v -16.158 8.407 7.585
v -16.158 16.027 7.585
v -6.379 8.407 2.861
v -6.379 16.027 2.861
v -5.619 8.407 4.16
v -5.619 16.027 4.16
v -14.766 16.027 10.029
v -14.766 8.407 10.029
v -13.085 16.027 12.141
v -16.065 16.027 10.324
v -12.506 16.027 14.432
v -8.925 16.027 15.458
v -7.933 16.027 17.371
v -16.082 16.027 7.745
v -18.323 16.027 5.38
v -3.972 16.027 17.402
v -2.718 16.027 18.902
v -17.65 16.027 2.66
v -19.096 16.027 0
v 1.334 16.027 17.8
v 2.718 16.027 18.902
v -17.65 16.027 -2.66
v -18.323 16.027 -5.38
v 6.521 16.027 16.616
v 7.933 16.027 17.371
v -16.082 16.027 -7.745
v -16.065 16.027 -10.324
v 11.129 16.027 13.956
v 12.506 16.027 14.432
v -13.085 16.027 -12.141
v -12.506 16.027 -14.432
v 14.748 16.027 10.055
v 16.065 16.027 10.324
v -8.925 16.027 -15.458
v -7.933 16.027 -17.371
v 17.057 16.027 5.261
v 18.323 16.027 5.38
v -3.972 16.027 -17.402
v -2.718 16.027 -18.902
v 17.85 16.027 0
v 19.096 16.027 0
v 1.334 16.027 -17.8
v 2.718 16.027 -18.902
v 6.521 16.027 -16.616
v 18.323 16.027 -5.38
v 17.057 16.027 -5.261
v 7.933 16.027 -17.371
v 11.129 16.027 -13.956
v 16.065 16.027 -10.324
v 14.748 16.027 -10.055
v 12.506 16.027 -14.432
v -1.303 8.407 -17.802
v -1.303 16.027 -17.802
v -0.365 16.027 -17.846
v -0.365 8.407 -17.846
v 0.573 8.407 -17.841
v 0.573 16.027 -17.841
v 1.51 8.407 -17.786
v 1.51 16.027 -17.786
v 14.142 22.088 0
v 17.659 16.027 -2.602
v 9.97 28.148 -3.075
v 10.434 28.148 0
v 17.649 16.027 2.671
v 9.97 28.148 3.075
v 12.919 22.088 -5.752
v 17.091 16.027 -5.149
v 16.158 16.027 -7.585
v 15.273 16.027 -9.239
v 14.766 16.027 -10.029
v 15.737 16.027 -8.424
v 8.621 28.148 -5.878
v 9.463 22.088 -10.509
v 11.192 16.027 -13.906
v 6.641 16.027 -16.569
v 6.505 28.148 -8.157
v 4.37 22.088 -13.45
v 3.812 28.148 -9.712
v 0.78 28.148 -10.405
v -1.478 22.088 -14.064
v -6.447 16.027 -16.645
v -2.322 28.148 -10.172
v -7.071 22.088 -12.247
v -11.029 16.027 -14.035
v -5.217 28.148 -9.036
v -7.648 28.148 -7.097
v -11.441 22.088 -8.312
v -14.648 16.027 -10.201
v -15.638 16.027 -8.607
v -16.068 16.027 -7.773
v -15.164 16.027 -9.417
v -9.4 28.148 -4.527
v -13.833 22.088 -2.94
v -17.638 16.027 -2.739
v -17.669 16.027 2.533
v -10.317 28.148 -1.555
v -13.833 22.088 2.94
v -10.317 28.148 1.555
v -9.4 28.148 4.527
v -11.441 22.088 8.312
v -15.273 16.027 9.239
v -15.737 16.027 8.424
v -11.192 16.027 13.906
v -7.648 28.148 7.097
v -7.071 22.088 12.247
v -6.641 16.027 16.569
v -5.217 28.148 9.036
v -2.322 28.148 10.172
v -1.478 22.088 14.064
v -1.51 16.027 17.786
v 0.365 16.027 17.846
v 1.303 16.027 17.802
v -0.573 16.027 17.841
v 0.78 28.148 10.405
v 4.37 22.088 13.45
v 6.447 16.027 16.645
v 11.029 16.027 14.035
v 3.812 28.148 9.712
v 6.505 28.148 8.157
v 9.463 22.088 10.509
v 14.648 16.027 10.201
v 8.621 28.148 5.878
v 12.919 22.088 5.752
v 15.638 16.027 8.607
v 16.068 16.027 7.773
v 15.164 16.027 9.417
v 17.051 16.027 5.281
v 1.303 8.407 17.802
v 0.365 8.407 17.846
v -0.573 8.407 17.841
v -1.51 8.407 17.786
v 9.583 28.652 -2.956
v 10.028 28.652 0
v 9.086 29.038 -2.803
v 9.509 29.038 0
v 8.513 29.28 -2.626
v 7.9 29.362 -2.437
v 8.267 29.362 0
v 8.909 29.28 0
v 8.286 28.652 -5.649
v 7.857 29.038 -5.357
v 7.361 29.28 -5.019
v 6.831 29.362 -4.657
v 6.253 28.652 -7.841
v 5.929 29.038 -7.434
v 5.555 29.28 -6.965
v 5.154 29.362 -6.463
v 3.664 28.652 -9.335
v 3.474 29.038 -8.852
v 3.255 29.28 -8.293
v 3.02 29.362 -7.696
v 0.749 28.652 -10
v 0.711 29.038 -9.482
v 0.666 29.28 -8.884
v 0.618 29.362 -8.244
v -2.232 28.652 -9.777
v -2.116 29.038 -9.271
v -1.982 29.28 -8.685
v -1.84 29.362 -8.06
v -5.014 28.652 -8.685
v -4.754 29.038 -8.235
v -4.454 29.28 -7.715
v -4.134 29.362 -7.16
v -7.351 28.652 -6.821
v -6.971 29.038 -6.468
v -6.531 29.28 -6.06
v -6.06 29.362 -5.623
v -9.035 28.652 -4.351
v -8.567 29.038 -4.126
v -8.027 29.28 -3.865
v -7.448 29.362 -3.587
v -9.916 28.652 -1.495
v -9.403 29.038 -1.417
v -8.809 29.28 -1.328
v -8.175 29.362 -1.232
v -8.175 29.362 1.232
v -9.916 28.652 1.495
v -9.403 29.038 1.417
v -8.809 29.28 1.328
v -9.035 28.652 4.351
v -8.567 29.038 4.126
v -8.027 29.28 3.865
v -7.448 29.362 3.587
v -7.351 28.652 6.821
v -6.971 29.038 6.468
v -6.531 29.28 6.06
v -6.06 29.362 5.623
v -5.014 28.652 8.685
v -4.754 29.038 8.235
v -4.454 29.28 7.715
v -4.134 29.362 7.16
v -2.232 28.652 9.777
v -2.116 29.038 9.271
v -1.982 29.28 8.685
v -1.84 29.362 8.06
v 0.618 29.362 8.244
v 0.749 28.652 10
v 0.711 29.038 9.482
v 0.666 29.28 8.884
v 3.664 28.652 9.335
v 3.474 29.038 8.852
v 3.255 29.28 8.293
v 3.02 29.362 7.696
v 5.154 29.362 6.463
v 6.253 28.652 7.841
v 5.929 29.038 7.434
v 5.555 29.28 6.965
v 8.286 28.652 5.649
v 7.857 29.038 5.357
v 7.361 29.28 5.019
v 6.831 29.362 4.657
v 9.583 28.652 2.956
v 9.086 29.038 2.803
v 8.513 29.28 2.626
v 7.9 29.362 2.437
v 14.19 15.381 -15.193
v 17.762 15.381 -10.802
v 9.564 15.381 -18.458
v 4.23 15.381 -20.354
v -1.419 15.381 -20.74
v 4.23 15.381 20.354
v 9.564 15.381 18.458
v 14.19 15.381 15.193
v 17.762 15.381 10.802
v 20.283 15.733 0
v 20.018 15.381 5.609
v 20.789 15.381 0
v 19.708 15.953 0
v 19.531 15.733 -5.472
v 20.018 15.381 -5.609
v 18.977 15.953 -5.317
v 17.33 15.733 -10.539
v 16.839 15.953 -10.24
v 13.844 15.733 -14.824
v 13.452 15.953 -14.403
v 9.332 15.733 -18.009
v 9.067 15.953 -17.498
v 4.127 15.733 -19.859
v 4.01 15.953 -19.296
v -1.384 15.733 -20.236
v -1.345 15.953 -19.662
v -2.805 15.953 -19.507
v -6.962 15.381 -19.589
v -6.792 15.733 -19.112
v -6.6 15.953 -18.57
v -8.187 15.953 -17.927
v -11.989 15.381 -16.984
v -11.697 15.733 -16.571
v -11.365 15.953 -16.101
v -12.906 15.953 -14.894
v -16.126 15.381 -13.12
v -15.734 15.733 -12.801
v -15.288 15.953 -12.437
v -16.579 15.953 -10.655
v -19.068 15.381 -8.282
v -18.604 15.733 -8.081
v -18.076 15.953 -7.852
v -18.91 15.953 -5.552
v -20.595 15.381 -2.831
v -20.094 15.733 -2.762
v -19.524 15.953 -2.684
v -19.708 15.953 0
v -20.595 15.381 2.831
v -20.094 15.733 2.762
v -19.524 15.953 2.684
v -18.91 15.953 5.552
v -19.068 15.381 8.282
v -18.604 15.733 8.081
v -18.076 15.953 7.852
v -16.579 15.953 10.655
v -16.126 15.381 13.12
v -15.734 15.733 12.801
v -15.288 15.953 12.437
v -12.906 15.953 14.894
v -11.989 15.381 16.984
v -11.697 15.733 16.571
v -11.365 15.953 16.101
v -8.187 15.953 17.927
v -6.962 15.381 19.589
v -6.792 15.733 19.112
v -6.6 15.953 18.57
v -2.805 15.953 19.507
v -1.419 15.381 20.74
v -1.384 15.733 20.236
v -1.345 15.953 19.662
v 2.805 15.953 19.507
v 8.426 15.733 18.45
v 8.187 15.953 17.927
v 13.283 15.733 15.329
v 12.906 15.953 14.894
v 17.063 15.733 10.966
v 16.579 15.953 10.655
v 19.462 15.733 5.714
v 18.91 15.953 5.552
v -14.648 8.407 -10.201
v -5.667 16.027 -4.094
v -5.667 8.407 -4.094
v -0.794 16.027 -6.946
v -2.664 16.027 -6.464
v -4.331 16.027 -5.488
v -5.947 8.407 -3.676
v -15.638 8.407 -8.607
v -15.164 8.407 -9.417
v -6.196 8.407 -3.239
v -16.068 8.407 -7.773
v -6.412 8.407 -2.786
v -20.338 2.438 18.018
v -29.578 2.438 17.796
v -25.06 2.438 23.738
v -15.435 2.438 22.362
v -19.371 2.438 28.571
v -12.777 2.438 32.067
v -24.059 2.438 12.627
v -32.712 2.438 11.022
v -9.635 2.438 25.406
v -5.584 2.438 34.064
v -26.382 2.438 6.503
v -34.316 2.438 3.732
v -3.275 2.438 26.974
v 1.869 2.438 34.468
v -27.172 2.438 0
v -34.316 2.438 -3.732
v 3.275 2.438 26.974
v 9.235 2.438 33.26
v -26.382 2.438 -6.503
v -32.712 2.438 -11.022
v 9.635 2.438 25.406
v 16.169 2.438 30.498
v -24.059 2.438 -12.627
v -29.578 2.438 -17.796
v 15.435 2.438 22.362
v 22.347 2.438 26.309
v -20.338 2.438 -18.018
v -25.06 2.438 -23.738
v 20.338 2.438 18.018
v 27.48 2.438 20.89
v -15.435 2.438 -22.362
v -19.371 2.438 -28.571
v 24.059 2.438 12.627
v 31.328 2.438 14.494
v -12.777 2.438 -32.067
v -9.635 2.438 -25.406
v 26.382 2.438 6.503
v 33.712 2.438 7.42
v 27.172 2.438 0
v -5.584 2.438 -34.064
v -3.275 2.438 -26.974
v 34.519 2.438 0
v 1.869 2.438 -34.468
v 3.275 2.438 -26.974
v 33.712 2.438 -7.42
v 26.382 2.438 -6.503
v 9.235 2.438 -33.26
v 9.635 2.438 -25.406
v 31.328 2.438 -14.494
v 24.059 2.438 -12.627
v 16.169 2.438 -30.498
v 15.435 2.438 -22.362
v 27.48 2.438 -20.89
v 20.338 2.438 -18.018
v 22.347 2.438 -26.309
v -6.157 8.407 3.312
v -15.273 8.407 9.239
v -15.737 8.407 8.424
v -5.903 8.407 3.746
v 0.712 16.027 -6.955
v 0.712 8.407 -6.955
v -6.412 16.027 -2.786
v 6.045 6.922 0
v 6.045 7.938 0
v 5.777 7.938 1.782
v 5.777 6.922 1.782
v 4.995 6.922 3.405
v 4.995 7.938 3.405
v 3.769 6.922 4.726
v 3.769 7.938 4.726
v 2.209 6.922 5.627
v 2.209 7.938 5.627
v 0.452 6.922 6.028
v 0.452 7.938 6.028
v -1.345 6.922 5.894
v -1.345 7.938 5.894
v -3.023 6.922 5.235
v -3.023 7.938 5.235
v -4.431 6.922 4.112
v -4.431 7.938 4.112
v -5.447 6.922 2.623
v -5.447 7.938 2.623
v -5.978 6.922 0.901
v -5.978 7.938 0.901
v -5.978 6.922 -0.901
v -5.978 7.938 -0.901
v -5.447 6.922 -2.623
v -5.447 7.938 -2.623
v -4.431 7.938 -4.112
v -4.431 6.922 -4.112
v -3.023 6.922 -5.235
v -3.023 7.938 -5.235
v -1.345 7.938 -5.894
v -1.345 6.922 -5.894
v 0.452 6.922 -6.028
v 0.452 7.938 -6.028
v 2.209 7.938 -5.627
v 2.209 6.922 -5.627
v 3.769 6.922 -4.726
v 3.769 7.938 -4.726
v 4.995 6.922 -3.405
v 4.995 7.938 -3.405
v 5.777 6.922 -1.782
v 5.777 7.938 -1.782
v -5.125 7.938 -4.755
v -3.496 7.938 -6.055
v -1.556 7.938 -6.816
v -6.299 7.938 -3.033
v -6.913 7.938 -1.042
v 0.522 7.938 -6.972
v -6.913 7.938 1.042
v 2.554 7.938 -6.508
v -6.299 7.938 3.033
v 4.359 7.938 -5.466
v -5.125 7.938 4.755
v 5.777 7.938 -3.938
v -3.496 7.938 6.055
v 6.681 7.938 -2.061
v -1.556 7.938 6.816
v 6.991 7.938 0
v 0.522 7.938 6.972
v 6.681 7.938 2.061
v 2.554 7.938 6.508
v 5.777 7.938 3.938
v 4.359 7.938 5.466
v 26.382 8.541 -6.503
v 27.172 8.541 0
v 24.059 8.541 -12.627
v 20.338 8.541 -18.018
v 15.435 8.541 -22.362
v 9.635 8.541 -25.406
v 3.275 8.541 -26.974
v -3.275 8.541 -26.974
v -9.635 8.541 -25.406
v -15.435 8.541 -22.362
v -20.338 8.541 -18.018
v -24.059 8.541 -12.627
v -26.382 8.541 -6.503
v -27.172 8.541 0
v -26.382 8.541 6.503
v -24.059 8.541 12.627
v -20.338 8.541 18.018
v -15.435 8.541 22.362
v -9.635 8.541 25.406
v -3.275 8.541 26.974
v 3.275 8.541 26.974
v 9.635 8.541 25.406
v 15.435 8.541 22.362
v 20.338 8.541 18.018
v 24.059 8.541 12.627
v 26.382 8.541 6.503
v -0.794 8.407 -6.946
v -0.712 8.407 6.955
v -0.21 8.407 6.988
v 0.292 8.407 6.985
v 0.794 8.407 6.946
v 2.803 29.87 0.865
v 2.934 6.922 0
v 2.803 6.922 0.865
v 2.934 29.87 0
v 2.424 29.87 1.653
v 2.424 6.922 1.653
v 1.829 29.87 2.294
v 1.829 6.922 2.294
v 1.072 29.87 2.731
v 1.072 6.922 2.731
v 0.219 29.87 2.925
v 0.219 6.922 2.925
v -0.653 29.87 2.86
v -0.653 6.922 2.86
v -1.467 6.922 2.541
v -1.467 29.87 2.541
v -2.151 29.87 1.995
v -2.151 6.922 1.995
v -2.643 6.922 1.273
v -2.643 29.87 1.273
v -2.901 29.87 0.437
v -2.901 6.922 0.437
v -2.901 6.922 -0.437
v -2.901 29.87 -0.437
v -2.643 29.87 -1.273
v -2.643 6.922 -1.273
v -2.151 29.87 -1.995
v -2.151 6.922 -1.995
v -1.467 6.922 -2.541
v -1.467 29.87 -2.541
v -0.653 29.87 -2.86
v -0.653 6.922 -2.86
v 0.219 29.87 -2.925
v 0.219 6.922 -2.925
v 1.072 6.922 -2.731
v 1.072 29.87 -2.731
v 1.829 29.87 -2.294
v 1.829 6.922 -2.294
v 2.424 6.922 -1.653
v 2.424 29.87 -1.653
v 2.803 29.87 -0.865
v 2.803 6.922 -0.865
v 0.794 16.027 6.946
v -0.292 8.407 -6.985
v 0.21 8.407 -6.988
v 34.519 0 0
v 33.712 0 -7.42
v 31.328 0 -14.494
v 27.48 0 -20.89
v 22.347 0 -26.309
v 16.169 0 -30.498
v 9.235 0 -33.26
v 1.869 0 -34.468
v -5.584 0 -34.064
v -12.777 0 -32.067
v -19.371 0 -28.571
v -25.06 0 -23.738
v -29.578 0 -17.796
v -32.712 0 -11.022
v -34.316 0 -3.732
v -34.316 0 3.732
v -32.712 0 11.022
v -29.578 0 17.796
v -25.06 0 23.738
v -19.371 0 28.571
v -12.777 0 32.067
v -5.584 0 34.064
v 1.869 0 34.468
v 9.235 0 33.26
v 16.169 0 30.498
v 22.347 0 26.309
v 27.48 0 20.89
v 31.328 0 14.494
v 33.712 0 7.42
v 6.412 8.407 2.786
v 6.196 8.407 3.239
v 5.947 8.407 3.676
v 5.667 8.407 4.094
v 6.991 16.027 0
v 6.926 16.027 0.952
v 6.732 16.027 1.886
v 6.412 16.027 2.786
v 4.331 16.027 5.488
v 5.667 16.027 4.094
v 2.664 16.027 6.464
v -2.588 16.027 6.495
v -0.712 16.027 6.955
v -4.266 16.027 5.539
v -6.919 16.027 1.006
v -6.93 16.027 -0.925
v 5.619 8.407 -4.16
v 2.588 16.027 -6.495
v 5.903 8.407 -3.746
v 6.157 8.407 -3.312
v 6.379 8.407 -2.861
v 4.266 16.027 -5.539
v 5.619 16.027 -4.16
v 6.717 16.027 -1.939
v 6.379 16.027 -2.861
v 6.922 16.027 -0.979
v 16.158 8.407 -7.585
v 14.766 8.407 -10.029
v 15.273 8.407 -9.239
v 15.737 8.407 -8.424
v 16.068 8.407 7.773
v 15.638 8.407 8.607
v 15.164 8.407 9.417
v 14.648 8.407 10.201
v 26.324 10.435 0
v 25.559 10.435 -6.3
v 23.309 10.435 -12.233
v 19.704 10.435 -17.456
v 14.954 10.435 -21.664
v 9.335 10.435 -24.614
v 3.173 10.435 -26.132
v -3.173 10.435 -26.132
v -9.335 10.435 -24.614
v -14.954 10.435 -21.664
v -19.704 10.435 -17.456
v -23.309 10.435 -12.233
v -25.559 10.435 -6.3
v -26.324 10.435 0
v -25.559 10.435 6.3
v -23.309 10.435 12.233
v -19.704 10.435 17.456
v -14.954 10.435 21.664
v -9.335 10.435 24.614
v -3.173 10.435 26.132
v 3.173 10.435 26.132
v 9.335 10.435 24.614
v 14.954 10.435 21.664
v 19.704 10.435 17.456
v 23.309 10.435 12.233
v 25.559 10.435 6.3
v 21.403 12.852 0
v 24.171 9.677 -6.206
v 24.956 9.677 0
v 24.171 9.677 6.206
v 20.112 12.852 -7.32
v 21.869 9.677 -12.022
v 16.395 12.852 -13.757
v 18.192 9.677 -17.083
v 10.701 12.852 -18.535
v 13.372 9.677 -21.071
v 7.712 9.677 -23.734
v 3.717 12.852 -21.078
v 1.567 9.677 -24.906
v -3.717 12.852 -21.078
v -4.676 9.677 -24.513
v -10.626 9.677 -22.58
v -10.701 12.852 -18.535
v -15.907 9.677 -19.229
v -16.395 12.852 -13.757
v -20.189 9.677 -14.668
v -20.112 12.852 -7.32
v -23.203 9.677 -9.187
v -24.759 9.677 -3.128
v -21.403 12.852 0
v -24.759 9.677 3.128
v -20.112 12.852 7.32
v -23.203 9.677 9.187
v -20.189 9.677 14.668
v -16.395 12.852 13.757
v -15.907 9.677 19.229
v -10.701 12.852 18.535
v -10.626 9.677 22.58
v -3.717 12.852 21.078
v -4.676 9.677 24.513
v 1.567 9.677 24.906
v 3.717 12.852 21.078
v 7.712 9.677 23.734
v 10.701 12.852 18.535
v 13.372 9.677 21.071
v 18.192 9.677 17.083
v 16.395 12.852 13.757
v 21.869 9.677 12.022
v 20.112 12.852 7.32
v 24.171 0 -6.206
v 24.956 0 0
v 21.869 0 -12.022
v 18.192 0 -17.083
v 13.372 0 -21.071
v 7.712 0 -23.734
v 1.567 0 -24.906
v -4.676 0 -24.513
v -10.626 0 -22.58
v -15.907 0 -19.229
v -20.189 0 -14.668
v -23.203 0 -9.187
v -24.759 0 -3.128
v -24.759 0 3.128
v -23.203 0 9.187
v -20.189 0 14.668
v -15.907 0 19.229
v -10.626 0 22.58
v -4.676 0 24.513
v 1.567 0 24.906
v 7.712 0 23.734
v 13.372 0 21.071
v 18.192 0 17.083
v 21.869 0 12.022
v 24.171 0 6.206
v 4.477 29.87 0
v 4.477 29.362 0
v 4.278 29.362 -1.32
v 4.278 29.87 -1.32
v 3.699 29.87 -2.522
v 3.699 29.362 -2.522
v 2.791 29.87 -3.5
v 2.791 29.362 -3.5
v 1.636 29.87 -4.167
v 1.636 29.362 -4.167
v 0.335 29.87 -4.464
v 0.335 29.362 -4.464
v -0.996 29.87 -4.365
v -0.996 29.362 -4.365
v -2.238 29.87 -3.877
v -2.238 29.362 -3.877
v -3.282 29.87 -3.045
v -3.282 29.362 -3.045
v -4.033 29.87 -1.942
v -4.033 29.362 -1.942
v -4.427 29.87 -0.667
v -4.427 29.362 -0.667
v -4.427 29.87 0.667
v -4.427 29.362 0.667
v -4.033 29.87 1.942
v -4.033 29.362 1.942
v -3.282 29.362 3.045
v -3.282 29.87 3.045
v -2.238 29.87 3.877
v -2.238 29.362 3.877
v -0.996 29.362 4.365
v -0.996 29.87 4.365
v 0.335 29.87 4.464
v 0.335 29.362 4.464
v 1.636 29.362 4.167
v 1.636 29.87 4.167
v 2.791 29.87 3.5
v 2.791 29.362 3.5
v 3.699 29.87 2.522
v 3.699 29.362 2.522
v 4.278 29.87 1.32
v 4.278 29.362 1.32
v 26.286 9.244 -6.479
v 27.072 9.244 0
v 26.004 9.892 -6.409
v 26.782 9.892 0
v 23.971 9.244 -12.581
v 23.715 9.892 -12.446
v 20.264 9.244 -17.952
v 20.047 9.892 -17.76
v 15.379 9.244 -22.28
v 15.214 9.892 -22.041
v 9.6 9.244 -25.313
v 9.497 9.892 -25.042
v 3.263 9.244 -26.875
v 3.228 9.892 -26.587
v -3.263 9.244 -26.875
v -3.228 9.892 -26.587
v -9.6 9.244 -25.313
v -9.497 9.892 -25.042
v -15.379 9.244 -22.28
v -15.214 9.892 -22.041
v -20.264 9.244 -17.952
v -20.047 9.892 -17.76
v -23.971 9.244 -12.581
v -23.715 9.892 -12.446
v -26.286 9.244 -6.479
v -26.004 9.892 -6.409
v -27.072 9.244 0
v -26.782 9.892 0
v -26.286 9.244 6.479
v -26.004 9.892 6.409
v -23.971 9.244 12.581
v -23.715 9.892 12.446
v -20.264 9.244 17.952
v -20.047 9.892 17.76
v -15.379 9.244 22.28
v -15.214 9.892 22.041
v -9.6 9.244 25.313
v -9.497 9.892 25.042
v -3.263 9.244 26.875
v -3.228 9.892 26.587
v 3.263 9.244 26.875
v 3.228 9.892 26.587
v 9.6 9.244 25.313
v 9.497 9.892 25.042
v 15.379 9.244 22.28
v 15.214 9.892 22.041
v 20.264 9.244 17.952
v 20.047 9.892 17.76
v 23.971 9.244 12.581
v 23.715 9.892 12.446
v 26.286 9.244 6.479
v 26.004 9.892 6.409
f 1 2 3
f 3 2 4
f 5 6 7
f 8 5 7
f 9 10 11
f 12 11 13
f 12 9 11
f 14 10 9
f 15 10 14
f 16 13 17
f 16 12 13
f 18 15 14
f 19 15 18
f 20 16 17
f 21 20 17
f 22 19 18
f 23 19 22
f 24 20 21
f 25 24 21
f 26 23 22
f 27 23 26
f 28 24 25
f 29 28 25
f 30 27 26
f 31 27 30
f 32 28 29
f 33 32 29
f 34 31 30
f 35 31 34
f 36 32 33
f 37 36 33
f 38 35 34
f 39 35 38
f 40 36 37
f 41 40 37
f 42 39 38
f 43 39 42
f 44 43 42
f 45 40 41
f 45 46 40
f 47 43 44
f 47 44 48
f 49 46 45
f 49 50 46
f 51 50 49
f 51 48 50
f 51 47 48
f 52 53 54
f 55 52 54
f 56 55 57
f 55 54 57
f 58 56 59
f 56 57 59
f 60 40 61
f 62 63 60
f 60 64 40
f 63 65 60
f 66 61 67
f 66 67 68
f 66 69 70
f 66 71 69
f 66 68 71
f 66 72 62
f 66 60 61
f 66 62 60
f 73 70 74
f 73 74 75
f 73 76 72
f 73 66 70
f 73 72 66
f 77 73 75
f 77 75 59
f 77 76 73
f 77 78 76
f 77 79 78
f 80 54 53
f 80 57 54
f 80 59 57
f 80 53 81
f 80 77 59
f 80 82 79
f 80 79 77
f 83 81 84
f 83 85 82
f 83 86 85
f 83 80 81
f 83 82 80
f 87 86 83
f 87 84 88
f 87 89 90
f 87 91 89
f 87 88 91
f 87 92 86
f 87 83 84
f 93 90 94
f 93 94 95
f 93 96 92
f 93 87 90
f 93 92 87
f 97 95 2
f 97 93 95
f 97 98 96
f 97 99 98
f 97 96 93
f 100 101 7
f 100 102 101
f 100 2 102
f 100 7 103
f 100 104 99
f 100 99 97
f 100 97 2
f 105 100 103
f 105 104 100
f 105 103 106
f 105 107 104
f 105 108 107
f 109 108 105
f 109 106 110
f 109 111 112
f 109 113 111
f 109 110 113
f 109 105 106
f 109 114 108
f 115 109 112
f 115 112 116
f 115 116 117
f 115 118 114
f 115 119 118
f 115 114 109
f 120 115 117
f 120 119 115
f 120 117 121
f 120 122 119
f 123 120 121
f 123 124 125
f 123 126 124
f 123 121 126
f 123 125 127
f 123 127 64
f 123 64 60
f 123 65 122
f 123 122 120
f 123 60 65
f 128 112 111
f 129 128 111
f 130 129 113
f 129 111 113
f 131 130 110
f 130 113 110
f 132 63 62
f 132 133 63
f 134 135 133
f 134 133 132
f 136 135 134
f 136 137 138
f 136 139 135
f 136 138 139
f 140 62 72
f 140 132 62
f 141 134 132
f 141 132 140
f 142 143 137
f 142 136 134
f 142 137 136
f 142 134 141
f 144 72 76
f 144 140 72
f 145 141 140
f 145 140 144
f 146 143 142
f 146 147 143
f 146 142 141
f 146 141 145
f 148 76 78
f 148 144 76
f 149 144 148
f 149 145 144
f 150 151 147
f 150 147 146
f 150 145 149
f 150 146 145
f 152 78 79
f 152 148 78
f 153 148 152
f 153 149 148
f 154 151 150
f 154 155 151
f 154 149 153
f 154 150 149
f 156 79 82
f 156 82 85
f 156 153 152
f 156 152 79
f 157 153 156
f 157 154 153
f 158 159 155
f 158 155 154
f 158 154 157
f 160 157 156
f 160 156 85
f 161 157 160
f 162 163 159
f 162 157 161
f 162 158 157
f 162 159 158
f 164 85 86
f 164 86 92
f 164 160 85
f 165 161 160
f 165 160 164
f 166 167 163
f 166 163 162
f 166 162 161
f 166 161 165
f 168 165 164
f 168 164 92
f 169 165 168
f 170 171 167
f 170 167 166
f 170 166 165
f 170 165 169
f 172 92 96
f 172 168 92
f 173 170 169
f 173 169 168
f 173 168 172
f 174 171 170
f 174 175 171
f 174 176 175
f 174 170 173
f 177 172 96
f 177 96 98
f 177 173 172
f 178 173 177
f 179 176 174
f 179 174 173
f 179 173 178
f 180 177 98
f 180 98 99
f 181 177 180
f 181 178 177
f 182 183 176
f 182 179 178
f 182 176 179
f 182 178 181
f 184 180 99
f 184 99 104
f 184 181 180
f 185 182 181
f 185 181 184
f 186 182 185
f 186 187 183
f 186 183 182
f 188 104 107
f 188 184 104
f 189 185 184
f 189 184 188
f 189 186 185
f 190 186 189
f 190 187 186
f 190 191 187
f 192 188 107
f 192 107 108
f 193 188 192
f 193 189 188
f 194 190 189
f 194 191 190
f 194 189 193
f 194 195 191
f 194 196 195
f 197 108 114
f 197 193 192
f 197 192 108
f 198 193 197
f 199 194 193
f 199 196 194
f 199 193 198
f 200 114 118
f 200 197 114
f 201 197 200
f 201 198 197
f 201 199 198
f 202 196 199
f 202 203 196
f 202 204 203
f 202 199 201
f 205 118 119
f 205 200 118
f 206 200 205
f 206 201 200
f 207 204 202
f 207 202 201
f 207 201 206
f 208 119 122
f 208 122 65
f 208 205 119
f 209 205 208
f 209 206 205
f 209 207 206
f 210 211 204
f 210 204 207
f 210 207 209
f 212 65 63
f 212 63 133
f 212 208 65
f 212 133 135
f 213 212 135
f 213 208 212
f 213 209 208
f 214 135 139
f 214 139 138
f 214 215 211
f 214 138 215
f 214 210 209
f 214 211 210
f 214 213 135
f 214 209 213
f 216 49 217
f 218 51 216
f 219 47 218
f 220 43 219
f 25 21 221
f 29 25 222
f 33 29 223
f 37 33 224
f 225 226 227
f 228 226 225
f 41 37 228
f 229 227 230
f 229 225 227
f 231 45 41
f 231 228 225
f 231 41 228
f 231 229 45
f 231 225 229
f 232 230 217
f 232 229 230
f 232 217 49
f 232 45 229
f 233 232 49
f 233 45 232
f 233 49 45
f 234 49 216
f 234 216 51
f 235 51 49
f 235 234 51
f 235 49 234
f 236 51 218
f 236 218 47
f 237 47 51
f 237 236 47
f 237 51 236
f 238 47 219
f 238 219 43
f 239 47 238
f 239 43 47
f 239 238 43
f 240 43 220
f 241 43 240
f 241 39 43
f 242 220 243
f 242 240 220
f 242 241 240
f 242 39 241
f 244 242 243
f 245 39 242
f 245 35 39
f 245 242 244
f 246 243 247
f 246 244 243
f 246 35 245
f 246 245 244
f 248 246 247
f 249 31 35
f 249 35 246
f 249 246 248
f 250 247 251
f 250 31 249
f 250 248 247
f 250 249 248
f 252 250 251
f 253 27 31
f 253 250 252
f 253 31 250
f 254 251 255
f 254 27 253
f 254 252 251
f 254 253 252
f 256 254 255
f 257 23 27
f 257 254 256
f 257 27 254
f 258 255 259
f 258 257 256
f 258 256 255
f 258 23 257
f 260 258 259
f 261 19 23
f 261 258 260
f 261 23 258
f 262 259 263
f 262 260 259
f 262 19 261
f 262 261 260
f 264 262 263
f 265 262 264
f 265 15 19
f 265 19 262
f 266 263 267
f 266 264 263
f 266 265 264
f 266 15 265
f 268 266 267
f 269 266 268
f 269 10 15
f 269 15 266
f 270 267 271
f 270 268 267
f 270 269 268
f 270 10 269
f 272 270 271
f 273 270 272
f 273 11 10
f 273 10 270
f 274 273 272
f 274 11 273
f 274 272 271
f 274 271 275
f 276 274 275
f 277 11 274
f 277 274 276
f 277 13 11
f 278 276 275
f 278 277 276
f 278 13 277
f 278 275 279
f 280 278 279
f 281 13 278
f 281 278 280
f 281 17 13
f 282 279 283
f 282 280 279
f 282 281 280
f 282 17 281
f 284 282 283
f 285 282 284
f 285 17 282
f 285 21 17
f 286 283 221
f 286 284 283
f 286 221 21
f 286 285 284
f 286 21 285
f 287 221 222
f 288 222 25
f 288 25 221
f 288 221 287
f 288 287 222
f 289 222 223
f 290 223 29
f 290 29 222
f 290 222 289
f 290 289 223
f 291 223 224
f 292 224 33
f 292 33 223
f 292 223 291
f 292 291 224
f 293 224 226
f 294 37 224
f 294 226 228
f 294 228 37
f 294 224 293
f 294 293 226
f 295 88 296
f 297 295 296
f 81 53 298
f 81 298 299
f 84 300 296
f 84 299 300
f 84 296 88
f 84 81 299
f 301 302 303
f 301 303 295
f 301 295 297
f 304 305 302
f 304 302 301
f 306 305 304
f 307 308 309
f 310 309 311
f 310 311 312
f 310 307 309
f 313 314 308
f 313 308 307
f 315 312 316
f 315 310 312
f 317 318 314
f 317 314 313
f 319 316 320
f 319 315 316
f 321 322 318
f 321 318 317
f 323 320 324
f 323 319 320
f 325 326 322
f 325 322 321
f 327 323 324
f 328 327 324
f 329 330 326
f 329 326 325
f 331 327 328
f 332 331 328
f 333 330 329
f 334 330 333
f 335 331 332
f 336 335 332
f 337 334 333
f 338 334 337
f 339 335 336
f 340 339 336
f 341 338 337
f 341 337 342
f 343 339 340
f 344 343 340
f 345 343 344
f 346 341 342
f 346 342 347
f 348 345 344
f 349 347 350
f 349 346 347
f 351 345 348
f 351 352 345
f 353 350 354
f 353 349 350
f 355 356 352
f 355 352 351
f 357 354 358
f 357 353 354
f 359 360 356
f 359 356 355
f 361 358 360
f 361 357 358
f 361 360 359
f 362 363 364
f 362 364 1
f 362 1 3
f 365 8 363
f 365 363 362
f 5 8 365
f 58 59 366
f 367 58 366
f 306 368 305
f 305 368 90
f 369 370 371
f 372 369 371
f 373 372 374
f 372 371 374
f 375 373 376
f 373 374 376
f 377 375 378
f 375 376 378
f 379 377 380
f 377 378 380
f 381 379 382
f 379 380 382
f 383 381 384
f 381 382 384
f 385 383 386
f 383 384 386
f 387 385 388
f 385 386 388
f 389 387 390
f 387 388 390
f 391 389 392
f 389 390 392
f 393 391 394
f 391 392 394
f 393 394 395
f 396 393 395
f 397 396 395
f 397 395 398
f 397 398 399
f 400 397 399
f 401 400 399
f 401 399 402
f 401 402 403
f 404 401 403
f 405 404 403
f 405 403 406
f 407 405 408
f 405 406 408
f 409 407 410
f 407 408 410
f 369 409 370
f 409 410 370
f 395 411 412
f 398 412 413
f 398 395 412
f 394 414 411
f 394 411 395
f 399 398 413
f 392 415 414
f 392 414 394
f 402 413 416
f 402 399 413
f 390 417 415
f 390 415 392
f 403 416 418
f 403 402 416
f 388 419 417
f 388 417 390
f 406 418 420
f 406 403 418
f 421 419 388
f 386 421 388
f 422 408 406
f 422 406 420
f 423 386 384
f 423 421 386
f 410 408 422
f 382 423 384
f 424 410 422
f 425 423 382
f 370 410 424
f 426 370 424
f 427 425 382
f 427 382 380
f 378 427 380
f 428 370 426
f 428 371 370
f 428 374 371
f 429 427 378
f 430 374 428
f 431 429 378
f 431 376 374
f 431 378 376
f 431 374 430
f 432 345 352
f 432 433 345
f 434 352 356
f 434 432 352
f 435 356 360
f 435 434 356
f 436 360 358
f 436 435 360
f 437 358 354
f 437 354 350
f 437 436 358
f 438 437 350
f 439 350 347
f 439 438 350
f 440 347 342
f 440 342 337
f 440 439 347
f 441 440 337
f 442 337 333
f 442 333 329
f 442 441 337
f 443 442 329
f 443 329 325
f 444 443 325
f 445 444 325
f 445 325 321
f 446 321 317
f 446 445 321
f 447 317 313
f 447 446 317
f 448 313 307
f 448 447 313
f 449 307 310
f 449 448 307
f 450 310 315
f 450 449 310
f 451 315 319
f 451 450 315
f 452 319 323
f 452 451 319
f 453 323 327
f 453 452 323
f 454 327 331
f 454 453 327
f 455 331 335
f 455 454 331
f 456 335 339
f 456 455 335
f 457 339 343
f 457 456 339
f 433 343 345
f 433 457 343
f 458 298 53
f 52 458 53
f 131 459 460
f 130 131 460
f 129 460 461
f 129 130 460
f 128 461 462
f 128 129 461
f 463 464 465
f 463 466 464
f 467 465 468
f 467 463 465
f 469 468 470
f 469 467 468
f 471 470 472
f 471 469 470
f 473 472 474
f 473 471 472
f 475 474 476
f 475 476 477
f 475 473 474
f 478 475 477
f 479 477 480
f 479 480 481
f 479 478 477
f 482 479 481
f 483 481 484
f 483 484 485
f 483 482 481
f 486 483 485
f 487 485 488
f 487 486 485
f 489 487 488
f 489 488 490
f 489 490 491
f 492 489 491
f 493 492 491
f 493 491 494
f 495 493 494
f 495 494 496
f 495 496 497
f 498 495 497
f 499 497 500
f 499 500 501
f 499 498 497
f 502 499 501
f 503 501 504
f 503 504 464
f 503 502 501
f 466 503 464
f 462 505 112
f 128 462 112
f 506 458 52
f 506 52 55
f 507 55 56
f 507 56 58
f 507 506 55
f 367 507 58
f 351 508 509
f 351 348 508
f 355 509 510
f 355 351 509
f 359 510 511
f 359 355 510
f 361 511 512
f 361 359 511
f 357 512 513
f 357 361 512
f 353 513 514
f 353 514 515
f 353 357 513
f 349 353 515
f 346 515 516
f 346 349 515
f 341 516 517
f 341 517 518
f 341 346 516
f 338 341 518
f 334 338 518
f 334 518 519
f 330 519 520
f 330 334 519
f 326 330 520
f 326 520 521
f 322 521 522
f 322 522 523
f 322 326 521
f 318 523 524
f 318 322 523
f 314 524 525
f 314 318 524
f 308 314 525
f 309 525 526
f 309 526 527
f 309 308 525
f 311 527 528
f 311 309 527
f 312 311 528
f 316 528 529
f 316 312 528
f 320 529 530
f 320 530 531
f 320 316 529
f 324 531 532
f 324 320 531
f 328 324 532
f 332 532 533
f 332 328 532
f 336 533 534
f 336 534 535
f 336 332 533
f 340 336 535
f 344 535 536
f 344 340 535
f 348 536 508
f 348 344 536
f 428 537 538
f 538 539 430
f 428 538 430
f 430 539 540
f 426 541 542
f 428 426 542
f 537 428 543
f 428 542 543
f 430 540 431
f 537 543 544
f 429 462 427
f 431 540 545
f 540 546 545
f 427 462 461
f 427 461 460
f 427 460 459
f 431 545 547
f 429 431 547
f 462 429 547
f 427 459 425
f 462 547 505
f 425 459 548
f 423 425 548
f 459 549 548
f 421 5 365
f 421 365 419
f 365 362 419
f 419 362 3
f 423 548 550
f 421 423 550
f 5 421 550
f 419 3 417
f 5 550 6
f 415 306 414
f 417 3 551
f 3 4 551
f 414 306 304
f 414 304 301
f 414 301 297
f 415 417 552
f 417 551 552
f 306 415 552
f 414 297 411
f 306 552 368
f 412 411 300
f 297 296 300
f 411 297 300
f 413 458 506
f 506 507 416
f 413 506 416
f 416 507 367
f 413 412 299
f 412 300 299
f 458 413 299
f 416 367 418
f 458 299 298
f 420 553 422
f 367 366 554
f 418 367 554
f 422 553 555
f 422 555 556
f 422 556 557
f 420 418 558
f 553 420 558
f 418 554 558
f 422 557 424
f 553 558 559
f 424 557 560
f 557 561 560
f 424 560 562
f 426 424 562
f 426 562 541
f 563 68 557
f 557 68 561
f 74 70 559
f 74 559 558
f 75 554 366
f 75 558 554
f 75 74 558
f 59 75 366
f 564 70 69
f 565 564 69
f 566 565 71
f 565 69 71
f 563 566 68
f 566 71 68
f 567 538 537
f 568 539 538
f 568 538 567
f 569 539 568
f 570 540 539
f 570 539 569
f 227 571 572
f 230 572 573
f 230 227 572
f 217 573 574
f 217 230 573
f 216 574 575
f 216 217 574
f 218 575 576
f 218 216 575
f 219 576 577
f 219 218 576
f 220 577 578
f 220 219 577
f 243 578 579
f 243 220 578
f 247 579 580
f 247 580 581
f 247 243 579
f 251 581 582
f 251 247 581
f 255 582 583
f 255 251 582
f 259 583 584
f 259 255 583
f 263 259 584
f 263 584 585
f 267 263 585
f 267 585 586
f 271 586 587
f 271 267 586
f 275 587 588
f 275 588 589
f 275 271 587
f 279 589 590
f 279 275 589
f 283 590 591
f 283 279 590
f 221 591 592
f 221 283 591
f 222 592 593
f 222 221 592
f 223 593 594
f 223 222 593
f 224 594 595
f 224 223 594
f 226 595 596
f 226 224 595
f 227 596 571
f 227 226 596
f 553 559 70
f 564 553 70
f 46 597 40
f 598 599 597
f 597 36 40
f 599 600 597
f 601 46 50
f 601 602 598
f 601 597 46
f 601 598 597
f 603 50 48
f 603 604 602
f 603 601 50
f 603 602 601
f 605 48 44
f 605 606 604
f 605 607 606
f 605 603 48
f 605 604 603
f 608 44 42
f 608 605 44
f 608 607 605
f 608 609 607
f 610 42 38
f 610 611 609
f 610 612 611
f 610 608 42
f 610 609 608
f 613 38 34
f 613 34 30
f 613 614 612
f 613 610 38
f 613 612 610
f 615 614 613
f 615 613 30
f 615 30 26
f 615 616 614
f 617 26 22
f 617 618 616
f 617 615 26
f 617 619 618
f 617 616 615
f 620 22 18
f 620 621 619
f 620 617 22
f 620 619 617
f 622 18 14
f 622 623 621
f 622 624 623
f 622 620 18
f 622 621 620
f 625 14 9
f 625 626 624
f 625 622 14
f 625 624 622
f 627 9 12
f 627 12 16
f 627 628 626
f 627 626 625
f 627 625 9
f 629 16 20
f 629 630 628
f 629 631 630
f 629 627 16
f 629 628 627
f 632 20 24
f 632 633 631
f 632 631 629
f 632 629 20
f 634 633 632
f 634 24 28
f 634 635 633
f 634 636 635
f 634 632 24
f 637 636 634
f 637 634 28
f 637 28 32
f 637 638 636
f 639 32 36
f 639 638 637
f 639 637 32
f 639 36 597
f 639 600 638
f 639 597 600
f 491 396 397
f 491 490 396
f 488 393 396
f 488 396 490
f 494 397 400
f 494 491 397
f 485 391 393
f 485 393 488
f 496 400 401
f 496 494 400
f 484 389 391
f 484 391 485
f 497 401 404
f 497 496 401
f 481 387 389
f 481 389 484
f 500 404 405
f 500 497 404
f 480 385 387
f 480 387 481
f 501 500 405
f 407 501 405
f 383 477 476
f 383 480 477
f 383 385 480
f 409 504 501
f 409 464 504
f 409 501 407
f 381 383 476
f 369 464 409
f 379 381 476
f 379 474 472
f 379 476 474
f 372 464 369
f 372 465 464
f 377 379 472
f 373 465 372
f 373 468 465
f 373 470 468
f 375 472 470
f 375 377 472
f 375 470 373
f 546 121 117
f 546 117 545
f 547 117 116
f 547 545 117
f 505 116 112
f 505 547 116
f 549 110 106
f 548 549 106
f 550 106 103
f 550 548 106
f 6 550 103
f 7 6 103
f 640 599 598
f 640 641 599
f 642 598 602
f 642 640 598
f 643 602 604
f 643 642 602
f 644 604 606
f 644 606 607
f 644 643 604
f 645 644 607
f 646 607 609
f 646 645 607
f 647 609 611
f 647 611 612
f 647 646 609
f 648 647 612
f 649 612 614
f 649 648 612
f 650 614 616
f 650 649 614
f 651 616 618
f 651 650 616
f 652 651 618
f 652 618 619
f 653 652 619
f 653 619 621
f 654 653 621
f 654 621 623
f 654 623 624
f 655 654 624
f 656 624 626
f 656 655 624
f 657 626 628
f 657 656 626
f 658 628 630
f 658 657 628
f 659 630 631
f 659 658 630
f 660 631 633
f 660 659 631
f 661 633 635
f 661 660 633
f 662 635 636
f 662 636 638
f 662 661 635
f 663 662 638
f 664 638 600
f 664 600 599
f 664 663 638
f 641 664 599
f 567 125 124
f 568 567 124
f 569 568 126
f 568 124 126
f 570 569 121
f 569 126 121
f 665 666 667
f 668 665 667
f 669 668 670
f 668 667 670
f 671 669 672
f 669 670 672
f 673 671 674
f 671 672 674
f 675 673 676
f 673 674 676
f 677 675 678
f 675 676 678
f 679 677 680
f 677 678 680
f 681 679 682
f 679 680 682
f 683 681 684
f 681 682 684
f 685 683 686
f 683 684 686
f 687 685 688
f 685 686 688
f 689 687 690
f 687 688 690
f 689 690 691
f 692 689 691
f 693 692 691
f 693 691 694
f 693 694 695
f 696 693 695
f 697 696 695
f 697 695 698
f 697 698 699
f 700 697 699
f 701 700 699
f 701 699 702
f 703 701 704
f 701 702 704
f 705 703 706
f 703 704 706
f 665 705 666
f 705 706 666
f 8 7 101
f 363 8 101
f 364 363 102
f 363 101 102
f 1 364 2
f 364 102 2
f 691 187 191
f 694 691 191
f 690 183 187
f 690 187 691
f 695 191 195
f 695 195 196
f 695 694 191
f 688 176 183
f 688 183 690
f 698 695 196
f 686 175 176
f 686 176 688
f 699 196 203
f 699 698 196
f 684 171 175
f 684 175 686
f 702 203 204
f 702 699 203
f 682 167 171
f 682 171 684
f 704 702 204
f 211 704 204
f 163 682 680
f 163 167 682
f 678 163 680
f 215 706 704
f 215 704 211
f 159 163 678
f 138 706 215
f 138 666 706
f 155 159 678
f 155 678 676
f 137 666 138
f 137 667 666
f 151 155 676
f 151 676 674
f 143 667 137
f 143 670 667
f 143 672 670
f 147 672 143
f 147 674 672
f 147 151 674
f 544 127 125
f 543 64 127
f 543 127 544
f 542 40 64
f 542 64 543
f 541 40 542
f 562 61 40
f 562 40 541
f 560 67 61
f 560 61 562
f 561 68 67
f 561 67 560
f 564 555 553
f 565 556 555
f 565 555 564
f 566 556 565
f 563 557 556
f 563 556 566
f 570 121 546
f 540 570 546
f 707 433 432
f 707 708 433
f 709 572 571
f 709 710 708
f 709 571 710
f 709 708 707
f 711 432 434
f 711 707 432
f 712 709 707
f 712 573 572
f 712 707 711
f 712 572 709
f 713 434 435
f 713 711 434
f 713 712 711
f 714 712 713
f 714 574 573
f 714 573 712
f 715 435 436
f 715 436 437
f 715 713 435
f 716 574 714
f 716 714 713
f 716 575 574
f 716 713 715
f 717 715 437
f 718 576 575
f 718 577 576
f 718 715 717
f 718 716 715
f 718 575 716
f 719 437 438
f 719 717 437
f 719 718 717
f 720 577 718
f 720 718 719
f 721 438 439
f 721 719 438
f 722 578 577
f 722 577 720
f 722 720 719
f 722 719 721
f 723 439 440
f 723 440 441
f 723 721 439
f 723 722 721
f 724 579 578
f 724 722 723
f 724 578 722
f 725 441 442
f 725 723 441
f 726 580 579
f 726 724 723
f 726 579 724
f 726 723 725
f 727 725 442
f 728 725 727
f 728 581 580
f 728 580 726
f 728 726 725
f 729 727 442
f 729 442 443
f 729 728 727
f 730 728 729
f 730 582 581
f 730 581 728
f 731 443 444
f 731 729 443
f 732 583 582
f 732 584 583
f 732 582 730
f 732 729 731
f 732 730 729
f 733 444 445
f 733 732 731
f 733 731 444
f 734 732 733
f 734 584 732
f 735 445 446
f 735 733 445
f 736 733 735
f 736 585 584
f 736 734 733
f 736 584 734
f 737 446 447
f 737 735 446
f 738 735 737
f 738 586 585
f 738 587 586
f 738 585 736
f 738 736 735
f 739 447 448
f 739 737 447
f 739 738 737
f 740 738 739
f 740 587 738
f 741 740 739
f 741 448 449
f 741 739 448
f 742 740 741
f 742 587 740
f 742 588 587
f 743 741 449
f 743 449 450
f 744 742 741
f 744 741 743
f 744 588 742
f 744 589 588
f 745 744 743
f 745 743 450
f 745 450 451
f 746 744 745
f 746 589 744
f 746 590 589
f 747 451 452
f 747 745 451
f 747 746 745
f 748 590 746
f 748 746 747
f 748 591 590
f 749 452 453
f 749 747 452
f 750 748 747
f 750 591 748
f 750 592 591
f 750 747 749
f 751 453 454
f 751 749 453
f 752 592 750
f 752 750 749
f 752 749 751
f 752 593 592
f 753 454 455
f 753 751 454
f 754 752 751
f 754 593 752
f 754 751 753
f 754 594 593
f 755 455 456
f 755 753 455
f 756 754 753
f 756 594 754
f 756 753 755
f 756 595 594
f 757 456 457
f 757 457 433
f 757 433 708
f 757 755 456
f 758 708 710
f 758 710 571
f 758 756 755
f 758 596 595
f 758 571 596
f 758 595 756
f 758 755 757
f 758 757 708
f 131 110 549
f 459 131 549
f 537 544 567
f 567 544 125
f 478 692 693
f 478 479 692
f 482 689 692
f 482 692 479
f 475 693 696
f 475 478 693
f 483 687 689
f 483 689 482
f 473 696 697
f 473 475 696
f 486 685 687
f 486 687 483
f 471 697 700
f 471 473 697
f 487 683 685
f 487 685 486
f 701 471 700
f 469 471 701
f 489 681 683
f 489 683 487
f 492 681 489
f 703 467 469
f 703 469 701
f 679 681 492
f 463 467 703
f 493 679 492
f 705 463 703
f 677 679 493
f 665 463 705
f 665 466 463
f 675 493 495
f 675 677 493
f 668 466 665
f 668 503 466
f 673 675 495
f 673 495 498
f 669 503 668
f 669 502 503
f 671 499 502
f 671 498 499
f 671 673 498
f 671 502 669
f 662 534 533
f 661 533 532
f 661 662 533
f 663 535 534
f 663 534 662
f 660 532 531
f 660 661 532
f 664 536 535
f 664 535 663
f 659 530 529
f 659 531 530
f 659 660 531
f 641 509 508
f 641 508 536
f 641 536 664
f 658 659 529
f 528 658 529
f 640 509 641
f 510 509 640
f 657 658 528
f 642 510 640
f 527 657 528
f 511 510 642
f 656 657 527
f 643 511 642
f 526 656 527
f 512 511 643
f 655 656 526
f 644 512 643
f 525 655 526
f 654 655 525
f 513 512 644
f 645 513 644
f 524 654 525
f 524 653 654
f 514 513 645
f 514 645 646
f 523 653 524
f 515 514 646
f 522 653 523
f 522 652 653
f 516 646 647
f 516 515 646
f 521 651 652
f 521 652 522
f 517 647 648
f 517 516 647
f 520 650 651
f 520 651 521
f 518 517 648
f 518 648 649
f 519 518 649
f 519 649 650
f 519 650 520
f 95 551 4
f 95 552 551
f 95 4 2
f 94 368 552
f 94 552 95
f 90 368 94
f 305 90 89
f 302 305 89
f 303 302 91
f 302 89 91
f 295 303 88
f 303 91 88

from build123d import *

# Parameters (mm, degrees)
SKETCH2_R           = 4.47675
SKETCH2_R_2         = 2.9337
BOSS_EXTRUDE1_DEPTH = 0.508
SKETCH3_R           = 6.99135
SKETCH3_R_2         = 2.9337
BOSS_EXTRUDE2_DEPTH = 8.0899
SKETCH4_R           = 6.0452
SKETCH4_R_2         = 2.9337
BOSS_EXTRUDE3_DEPTH = 1.016
BOSS_EXTRUDE4_DEPTH = 7.62


with BuildPart() as part:
    # Sketch1 → Revolve1 (revolve)
    with BuildSketch(Plane.XY):
        with BuildLine():
            Line((27.17165, 0), (34.5186, 0))
            Line((34.5186, 0), (34.5186, 2.4384))
            Line((34.5186, 2.4384), (27.17165, 2.4384))
            Line((27.17165, 2.4384), (27.17165, 8.540823407))
            ThreePointArc((27.17165, 8.540823407), (26.950119612, 9.578271554), (26.324170742, 10.434754118))
            Line((26.324170742, 10.434754118), (20.788951535, 15.381330711))
            ThreePointArc((20.788951535, 15.381330711), (20.002249757, 15.860392204), (19.096430792, 16.0274))
            Line((19.096430792, 16.0274), (17.84985, 16.0274))
            Line((17.84985, 16.0274), (24.9555, 9.6774))
            Line((24.9555, 9.6774), (24.9555, 0))
            Line((24.9555, 0), (27.17165, 0))
        make_face()
    revolve(axis=Axis((0, 0, 0), (0, 1, 0)))


with BuildPart() as body_2:
    # Sketch1<3> → Revolve2 (revolve)
    with BuildSketch(Plane.XY):
        with BuildLine():
            Line((2.9337, 16.0274), (17.84985, 16.0274))
            Line((17.84985, 16.0274), (10.433708778, 28.148063183))
            ThreePointArc((10.433708778, 28.148063183), (9.508951147, 29.038114838), (8.26709457, 29.3624))
            Line((8.26709457, 29.3624), (2.9337, 29.3624))
            Line((2.9337, 29.3624), (2.9337, 16.0274))
        make_face()
    revolve(axis=Axis((0, 0, 0), (0, 1, 0)))

    # Sketch2 → Boss-Extrude1 (add)
    with BuildSketch(Plane(origin=(0, 29.3624, 0), x_dir=(1, 0, 0), z_dir=(0, 1, 0))):
        Circle(SKETCH2_R)
        Circle(SKETCH2_R_2, mode=Mode.SUBTRACT)
    extrude(amount=BOSS_EXTRUDE1_DEPTH)

    # Sketch3 → Boss-Extrude2 (add)
    with BuildSketch(Plane.XZ.offset(-16.0274)):
        Circle(SKETCH3_R)
        Circle(SKETCH3_R_2, mode=Mode.SUBTRACT)
    extrude(amount=BOSS_EXTRUDE2_DEPTH)

    # Sketch4 → Boss-Extrude3 (add)
    with BuildSketch(Plane.XZ.offset(-7.9375)):
        Circle(SKETCH4_R)
        Circle(SKETCH4_R_2, mode=Mode.SUBTRACT)
    extrude(amount=BOSS_EXTRUDE3_DEPTH)

    # Sketch5 → Boss-Extrude4 (add)
    with BuildSketch(Plane.XZ.offset(-16.0274)):
        with BuildLine():
            ThreePointArc((-6.379230805, 2.860837142), (-6.034045723, 3.531184933), (-5.618677723, 4.160460968))
            Line((-5.618677723, 4.160460968), (-14.765958792, 10.029137848))
            ThreePointArc((-14.765958792, 10.029137848), (-15.510246483, 8.834557095), (-16.158099934, 7.585047892))
            Line((-16.158099934, 7.585047892), (-6.379230805, 2.860837142))
        make_face()
        with BuildLine():
            ThreePointArc((-5.667173044, -4.094157363), (-6.075118719, -3.460044417), (-6.412403751, -2.78568716))
            Line((-6.412403751, -2.78568716), (-16.068467551, -7.773126501))
            ThreePointArc((-16.068467551, -7.773126501), (-15.406074117, -9.014988925), (-14.647894131, -10.200801074))
            Line((-14.647894131, -10.200801074), (-5.667173044, -4.094157363))
        make_face()
        with BuildLine():
            Line((16.158099934, -7.585047892), (6.379230805, -2.860837142))
            ThreePointArc((6.379230805, -2.860837142), (6.034045723, -3.531184933), (5.618677723, -4.160460968))
            Line((5.618677723, -4.160460968), (14.765958792, -10.029137848))
            ThreePointArc((14.765958792, -10.029137848), (15.510246483, -8.834557095), (16.158099934, -7.585047892))
        make_face()
        with BuildLine():
            Line((14.647894131, 10.200801074), (5.667173044, 4.094157363))
            ThreePointArc((5.667173044, 4.094157363), (6.075118719, 3.460044417), (6.412403751, 2.78568716))
            Line((6.412403751, 2.78568716), (16.068467551, 7.773126501))
            ThreePointArc((16.068467551, 7.773126501), (15.406074117, 9.014988925), (14.647894131, 10.200801074))
        make_face()
        with BuildLine():
            ThreePointArc((0.712057762, -6.954994505), (-0.041072996, -6.991229351), (-0.793726028, -6.946148128))
            Line((-0.793726028, -6.946148128), (-1.302508759, -17.802264349))
            ThreePointArc((-1.302508759, -17.802264349), (0.104172366, -17.849546021), (1.510205804, -17.785848966))
            Line((1.510205804, -17.785848966), (0.712057762, -6.954994505))
        make_face()
        with BuildLine():
            Line((0.793726028, 6.946148128), (1.302508759, 17.802264349))
            ThreePointArc((1.302508759, 17.802264349), (-0.104172366, 17.849546021), (-1.510205804, 17.785848966))
            Line((-1.510205804, 17.785848966), (-0.712057762, 6.954994505))
            ThreePointArc((-0.712057762, 6.954994505), (0.041072996, 6.991229351), (0.793726028, 6.946148128))
        make_face()
    extrude(amount=BOSS_EXTRUDE4_DEPTH)


solid = Compound([part.part, body_2.part])
